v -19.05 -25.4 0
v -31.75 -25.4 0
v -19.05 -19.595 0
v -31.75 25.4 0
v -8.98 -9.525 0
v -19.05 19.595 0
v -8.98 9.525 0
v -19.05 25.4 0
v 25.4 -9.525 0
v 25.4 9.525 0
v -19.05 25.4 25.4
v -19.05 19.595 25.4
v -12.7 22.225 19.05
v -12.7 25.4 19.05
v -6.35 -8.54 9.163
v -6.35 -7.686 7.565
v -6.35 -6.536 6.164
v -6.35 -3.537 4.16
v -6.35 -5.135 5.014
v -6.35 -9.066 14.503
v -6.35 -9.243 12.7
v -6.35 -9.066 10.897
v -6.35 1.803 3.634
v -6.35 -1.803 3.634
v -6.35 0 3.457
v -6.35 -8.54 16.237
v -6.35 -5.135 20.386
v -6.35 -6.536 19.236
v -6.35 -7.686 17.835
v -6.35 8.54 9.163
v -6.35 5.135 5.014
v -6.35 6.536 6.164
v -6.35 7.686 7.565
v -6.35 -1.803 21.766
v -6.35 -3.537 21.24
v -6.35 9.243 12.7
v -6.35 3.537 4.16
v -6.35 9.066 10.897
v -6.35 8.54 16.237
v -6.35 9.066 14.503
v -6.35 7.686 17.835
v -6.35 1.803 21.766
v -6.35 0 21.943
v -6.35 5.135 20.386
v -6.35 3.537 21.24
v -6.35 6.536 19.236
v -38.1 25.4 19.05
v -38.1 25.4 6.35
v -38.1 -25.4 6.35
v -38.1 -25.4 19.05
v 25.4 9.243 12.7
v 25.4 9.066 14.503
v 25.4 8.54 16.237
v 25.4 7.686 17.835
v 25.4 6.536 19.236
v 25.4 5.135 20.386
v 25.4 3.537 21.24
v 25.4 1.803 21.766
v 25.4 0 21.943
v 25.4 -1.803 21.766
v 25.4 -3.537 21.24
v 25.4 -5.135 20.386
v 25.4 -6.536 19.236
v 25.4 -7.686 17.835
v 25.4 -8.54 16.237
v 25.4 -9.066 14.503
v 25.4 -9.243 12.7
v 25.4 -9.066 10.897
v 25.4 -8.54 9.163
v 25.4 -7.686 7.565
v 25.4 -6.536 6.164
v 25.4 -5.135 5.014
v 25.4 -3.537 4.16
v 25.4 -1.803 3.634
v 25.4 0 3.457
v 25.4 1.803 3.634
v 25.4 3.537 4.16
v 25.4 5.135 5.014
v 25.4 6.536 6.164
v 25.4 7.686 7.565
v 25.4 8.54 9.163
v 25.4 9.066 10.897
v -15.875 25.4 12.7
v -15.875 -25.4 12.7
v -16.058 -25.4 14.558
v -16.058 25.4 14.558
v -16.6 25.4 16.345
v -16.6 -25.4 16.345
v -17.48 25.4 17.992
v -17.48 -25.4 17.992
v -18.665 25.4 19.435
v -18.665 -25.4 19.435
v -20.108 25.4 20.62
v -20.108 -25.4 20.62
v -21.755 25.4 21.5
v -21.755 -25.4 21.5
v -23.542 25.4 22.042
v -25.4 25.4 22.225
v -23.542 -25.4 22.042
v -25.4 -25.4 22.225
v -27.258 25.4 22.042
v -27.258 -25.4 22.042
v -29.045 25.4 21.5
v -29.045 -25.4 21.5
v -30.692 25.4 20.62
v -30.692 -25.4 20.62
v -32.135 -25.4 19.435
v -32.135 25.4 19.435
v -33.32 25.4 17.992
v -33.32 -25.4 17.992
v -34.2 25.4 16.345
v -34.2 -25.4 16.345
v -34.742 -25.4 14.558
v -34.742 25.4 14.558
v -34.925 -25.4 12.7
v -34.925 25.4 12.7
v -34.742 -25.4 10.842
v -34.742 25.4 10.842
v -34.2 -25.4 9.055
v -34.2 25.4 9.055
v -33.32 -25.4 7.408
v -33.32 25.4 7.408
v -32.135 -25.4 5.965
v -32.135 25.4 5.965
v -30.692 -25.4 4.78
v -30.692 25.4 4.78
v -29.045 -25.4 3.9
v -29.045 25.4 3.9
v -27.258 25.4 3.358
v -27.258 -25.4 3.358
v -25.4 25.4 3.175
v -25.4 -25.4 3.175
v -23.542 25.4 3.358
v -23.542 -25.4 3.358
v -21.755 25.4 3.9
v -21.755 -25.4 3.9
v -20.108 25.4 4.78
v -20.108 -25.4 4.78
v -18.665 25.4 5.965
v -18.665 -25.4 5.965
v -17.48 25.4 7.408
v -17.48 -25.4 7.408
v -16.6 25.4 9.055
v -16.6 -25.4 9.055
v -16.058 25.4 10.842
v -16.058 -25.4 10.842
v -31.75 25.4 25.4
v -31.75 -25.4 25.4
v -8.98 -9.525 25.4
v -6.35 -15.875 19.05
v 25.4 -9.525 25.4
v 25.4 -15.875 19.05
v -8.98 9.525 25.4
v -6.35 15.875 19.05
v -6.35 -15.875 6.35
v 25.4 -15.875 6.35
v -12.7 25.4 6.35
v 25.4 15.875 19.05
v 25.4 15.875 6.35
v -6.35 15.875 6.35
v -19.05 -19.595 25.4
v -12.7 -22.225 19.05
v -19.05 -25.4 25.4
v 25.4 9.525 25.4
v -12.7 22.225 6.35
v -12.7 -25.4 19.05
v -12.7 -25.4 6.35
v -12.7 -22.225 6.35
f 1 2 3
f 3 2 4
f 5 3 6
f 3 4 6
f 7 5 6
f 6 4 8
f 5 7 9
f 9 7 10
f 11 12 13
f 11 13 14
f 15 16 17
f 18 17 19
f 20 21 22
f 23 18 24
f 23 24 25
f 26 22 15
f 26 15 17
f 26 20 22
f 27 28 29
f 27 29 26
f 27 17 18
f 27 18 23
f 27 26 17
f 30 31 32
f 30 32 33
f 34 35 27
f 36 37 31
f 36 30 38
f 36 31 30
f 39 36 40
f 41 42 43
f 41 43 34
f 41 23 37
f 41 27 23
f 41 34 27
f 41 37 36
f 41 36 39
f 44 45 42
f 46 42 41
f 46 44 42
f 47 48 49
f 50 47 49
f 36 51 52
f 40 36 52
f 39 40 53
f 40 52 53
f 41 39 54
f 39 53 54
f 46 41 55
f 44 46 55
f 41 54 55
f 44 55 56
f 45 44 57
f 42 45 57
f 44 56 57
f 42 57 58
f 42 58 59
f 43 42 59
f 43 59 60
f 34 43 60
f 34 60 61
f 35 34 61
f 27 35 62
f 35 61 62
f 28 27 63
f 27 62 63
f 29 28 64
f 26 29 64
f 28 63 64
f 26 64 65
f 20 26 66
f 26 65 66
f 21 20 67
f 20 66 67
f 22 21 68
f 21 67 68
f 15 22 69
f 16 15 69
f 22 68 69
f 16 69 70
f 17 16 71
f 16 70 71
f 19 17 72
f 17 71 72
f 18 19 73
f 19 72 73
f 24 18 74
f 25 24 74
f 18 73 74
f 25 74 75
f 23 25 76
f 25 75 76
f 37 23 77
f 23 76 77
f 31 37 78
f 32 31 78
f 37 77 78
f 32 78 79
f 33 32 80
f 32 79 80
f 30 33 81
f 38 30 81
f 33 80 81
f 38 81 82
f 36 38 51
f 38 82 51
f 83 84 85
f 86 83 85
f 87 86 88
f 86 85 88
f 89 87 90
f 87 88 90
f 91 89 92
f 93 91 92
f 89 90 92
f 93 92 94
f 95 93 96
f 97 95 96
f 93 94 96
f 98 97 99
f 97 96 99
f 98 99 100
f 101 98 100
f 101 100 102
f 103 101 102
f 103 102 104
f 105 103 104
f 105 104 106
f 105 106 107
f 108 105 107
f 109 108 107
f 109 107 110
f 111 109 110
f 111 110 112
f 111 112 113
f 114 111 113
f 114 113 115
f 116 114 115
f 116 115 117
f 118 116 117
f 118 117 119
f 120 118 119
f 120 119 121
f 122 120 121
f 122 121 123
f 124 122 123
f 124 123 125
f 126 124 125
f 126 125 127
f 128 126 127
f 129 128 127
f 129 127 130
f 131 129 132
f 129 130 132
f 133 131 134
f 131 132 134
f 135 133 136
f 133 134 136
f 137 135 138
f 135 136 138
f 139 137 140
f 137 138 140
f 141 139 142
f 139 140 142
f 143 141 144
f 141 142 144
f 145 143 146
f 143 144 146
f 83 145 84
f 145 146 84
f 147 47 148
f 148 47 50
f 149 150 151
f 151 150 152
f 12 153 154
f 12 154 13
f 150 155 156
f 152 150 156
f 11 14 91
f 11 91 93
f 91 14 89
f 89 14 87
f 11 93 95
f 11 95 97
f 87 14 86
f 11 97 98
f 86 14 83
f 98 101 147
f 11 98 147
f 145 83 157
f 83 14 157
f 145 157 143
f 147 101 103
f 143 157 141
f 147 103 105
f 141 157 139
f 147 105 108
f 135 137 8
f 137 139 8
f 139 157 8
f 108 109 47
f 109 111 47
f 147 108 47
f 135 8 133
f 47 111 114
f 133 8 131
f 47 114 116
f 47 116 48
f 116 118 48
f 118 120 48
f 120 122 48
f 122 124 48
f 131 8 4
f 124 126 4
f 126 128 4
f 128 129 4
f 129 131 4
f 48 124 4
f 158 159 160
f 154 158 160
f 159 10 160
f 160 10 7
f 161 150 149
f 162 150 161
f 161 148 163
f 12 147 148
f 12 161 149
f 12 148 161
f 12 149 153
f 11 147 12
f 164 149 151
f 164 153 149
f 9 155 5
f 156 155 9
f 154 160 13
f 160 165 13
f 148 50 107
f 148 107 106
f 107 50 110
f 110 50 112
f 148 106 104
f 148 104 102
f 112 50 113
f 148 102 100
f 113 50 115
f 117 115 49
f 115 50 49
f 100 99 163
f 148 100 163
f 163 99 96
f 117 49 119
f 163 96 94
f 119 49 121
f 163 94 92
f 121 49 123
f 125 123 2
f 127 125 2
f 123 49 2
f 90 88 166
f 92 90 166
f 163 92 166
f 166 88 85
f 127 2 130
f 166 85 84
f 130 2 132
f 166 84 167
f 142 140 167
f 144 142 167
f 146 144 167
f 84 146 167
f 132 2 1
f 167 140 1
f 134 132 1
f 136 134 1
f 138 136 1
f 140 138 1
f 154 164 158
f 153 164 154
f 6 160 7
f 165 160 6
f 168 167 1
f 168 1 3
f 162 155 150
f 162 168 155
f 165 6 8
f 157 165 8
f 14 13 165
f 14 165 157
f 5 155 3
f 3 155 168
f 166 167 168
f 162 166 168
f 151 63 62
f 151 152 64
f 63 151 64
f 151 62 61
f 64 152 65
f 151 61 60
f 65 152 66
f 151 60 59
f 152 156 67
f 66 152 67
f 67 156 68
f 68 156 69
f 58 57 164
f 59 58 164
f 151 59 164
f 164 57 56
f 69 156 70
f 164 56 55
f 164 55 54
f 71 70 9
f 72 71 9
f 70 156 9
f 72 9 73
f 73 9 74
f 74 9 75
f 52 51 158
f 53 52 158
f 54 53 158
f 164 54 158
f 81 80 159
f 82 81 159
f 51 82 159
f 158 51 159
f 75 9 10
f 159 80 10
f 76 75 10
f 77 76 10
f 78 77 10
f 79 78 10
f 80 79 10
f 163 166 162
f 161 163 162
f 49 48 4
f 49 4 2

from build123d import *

# Parameters (mm, degrees)
F1_DEPTH = 25.4
F2_R     = 9.525
F3_DEPTH = 91.186
F4_R     = 9.2433485979
F5_DEPTH = 31.75
F6_SIZE  = 6.35
F7_SIZE  = 6.35


with BuildPart() as f1:
    # F0 (on Top) → F1 (new body)
    with BuildSketch(Plane.XY):
        Polygon((25.4, 15.875), (-12.7, 15.875), (-12.7, 25.4), (-38.1, 25.4), (-38.1, -25.4), (-12.7, -25.4), (-12.7, -15.875), (25.4, -15.875), align=None)
    extrude(amount=F1_DEPTH)

    # F2 (on face) → F3 (cut)
    with BuildSketch(Plane.XZ.offset(25.4)):
        with Locations((-25.4, 12.7)):
            Circle(F2_R)
    extrude(amount=-F3_DEPTH, mode=Mode.SUBTRACT)

    # F4 (on face) → F5 (cut)
    with BuildSketch(Plane.YZ.offset(25.4)):
        with Locations((0, 12.7)):
            Circle(F4_R)
    extrude(amount=-F5_DEPTH, mode=Mode.SUBTRACT)

    # F6
    f6_edges = [f1.edges().sort_by_distance(p)[0] for p in [
        (-12.7, 15.875, 12.7),
        (-12.7, -15.875, 12.7),
    ]]
    chamfer(f6_edges, length=F6_SIZE)

    # F7
    f7_edges = [f1.edges().sort_by_distance(p)[0] for p in [
        (-12.7, -23.8125, 25.4),
        (-9.525, -19.05, 25.4),
        (9.525, -15.875, 25.4),
        (9.525, 15.875, 25.4),
        (-9.525, 19.05, 25.4),
        (-12.7, 23.8125, 25.4),
        (-38.1, 0, 25.4),
        (9.525, 15.875, 0),
        (-9.525, 19.05, 0),
        (-12.7, 23.8125, 0),
        (-38.1, 0, 0),
        (-12.7, -23.8125, 0),
        (-9.525, -19.05, 0),
        (9.525, -15.875, 0),
    ]]
    chamfer(f7_edges, length=F7_SIZE)


solid = f1.part
